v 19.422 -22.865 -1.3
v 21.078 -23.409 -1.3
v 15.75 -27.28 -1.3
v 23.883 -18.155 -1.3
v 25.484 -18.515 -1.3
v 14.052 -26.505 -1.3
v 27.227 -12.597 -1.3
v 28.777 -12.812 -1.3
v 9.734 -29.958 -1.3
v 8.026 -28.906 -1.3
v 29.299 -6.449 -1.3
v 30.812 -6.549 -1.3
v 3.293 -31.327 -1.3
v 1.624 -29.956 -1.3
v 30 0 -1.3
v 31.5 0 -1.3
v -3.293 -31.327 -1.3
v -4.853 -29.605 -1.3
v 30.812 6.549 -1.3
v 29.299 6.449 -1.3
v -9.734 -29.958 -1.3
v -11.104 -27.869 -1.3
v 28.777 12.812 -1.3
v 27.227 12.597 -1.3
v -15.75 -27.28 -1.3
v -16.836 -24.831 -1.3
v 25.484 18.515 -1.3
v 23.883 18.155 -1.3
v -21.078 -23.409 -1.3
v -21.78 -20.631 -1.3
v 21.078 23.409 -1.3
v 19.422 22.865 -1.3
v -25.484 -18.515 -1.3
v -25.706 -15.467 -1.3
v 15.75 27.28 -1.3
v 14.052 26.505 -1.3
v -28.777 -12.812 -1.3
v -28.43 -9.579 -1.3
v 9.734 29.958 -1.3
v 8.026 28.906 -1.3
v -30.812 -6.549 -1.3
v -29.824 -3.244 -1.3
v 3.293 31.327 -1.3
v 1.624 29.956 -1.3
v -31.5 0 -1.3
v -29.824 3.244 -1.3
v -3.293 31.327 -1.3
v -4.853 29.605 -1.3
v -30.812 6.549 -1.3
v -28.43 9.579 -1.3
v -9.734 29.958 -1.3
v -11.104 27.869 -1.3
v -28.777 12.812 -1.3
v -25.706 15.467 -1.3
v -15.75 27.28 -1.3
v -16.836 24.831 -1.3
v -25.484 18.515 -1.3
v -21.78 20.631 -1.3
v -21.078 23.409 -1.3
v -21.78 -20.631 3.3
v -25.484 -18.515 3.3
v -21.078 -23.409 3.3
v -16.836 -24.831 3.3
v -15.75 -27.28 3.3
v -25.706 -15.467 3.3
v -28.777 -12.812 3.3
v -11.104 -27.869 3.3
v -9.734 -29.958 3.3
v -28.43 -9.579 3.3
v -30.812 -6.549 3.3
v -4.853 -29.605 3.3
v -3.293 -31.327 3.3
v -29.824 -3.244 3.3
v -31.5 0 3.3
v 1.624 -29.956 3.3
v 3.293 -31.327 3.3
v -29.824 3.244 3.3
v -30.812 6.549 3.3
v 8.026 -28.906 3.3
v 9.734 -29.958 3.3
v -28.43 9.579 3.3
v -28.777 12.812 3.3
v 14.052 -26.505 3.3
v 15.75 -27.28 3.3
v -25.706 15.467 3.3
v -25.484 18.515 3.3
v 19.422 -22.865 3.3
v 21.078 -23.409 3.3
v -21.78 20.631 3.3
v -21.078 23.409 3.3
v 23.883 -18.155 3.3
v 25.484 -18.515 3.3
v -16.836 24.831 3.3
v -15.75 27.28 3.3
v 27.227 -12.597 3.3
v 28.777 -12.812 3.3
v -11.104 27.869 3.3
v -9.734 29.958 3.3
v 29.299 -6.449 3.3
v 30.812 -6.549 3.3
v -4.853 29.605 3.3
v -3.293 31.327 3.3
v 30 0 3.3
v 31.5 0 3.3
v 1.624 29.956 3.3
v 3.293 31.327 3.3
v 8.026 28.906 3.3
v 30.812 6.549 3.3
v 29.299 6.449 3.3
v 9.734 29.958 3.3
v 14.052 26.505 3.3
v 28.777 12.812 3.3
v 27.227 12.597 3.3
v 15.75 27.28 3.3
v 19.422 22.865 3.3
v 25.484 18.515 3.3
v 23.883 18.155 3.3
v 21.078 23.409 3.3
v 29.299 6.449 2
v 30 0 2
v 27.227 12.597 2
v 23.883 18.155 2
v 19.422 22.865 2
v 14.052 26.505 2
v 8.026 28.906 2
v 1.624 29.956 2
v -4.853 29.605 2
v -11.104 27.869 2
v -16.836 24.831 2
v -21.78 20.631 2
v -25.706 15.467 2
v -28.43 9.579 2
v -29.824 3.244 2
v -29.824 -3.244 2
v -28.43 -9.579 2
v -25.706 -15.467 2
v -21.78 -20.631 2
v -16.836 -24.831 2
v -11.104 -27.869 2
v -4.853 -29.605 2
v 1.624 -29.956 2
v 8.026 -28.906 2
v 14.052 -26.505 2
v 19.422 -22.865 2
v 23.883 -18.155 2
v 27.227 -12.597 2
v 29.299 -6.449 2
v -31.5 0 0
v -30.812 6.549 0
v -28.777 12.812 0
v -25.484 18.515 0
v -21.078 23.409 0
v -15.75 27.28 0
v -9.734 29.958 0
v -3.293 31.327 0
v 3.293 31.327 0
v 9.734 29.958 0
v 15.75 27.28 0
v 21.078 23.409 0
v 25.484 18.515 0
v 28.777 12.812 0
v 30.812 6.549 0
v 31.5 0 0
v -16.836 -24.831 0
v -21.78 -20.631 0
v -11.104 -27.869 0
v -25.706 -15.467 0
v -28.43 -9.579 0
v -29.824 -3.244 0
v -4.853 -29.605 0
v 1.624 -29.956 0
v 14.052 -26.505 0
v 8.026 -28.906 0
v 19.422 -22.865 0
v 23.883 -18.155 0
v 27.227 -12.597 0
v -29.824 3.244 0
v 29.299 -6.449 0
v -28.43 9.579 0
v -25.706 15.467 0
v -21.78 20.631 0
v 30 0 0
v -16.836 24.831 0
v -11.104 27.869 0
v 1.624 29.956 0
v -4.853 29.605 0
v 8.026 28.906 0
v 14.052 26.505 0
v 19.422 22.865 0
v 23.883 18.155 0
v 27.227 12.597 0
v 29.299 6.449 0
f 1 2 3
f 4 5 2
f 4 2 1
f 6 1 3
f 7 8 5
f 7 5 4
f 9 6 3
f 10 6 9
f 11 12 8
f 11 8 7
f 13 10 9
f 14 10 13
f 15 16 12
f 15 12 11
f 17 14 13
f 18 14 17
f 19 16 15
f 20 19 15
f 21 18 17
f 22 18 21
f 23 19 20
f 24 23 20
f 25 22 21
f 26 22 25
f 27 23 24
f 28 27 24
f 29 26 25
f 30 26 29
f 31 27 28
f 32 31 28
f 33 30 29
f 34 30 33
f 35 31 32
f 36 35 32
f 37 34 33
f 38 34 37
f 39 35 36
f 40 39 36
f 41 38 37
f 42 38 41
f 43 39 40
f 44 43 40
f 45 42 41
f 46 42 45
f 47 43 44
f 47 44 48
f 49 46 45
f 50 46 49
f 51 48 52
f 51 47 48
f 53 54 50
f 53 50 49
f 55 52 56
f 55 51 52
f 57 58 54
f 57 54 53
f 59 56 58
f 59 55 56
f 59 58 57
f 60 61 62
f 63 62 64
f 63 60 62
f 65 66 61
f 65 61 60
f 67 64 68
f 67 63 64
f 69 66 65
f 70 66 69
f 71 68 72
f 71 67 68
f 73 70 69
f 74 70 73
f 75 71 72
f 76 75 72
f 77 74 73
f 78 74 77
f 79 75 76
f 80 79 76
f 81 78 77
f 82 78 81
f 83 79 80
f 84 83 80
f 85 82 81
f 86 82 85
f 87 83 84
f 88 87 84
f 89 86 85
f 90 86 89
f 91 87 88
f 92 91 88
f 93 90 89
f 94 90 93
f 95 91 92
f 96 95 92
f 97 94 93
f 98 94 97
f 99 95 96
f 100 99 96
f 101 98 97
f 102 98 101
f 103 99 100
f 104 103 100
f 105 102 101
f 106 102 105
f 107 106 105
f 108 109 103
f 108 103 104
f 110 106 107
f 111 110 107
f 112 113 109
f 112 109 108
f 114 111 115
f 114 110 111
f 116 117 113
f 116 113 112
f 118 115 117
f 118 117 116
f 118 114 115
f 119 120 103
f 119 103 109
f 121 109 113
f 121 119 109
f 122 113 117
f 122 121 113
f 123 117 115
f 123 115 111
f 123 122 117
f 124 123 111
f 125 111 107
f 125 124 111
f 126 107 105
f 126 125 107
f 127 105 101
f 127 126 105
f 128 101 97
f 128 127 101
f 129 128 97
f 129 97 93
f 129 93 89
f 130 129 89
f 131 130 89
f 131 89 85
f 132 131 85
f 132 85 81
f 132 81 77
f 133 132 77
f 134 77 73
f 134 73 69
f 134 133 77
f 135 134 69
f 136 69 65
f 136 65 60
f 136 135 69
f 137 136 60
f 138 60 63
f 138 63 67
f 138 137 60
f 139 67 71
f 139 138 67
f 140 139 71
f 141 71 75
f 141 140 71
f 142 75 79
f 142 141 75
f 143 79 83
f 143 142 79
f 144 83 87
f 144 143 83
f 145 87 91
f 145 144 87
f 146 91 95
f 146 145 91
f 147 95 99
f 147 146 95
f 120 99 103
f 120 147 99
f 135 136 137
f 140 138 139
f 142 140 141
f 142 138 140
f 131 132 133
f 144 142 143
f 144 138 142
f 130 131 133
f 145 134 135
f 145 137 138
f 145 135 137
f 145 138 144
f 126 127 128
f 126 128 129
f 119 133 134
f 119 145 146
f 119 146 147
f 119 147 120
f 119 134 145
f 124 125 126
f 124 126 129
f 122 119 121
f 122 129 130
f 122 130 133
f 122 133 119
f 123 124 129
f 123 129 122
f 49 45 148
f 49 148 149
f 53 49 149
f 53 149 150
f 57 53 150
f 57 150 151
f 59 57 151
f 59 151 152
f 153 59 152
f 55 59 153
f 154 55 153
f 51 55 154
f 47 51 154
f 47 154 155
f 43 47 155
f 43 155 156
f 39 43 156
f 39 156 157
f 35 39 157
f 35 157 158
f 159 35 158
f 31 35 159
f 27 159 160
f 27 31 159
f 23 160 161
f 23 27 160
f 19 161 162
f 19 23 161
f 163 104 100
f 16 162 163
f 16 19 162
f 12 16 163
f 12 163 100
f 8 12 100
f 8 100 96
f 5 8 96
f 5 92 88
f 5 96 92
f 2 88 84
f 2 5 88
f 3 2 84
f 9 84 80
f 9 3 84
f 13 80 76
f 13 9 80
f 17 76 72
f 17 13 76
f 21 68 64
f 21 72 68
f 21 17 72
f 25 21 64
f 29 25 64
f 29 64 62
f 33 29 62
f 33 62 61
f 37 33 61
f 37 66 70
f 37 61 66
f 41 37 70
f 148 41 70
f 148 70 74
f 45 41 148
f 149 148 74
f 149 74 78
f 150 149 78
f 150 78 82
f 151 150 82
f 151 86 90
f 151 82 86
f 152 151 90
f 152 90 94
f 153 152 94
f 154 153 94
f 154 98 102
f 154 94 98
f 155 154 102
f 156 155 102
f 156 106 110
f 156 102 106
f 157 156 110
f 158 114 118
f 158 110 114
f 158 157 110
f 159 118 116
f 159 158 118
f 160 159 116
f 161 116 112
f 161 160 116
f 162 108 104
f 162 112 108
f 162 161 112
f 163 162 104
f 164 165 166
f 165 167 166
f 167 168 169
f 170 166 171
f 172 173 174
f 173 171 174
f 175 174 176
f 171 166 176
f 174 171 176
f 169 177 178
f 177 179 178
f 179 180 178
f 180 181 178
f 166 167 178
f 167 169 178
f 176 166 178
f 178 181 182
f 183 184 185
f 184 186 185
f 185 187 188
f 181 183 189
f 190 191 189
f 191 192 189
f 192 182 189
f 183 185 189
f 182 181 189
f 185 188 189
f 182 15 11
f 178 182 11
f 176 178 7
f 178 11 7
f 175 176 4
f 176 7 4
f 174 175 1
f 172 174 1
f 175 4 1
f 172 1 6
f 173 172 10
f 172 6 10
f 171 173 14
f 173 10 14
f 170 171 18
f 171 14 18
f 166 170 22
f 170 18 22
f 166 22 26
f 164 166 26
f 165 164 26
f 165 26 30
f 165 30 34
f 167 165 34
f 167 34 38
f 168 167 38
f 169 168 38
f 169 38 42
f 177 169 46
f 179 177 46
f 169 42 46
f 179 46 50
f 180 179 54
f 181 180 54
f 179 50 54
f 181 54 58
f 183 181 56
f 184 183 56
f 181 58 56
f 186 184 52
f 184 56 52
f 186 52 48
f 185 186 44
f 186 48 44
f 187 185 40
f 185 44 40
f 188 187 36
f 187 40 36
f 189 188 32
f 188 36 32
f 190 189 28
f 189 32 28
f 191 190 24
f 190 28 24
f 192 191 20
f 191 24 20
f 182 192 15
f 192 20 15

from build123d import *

# Parameters (mm, degrees)
SKETCH_1_R      = 31.5
EXTRUDE_1_DEPTH = 2
SKETCH_2_R      = 31.5
SKETCH_2_R_2    = 30
EXTRUDE_2_DEPTH = 1.3
EXTRUDE_START   = 1.3
SKETCH_3_R      = 31.5
SKETCH_3_R_2    = 30
EXTRUDE_3_DEPTH = 1.3


with BuildPart() as part:
    # 스케치1 → 보스-돌출1 (new body)
    with BuildSketch(Plane.XY):
        Circle(SKETCH_1_R)
    extrude(amount=EXTRUDE_1_DEPTH)

    # 스케치2 → 보스-돌출2 (add)
    with BuildSketch(Plane.XY.offset(2)):
        Circle(SKETCH_2_R)
        Circle(SKETCH_2_R_2, mode=Mode.SUBTRACT)
    extrude(amount=EXTRUDE_2_DEPTH)

    # 스케치3 → 보스-돌출3 (add)
    with BuildSketch(Plane(origin=(0, 0, 0), x_dir=(-1, 0, 0), z_dir=(0, 0, -1)).offset(EXTRUDE_START)):
        Circle(SKETCH_3_R)
        with Locations(Location((0, 0, 0), (0, 0, 180))):
            Circle(SKETCH_3_R_2, mode=Mode.SUBTRACT)
    extrude(amount=-EXTRUDE_3_DEPTH)


solid = part.part
